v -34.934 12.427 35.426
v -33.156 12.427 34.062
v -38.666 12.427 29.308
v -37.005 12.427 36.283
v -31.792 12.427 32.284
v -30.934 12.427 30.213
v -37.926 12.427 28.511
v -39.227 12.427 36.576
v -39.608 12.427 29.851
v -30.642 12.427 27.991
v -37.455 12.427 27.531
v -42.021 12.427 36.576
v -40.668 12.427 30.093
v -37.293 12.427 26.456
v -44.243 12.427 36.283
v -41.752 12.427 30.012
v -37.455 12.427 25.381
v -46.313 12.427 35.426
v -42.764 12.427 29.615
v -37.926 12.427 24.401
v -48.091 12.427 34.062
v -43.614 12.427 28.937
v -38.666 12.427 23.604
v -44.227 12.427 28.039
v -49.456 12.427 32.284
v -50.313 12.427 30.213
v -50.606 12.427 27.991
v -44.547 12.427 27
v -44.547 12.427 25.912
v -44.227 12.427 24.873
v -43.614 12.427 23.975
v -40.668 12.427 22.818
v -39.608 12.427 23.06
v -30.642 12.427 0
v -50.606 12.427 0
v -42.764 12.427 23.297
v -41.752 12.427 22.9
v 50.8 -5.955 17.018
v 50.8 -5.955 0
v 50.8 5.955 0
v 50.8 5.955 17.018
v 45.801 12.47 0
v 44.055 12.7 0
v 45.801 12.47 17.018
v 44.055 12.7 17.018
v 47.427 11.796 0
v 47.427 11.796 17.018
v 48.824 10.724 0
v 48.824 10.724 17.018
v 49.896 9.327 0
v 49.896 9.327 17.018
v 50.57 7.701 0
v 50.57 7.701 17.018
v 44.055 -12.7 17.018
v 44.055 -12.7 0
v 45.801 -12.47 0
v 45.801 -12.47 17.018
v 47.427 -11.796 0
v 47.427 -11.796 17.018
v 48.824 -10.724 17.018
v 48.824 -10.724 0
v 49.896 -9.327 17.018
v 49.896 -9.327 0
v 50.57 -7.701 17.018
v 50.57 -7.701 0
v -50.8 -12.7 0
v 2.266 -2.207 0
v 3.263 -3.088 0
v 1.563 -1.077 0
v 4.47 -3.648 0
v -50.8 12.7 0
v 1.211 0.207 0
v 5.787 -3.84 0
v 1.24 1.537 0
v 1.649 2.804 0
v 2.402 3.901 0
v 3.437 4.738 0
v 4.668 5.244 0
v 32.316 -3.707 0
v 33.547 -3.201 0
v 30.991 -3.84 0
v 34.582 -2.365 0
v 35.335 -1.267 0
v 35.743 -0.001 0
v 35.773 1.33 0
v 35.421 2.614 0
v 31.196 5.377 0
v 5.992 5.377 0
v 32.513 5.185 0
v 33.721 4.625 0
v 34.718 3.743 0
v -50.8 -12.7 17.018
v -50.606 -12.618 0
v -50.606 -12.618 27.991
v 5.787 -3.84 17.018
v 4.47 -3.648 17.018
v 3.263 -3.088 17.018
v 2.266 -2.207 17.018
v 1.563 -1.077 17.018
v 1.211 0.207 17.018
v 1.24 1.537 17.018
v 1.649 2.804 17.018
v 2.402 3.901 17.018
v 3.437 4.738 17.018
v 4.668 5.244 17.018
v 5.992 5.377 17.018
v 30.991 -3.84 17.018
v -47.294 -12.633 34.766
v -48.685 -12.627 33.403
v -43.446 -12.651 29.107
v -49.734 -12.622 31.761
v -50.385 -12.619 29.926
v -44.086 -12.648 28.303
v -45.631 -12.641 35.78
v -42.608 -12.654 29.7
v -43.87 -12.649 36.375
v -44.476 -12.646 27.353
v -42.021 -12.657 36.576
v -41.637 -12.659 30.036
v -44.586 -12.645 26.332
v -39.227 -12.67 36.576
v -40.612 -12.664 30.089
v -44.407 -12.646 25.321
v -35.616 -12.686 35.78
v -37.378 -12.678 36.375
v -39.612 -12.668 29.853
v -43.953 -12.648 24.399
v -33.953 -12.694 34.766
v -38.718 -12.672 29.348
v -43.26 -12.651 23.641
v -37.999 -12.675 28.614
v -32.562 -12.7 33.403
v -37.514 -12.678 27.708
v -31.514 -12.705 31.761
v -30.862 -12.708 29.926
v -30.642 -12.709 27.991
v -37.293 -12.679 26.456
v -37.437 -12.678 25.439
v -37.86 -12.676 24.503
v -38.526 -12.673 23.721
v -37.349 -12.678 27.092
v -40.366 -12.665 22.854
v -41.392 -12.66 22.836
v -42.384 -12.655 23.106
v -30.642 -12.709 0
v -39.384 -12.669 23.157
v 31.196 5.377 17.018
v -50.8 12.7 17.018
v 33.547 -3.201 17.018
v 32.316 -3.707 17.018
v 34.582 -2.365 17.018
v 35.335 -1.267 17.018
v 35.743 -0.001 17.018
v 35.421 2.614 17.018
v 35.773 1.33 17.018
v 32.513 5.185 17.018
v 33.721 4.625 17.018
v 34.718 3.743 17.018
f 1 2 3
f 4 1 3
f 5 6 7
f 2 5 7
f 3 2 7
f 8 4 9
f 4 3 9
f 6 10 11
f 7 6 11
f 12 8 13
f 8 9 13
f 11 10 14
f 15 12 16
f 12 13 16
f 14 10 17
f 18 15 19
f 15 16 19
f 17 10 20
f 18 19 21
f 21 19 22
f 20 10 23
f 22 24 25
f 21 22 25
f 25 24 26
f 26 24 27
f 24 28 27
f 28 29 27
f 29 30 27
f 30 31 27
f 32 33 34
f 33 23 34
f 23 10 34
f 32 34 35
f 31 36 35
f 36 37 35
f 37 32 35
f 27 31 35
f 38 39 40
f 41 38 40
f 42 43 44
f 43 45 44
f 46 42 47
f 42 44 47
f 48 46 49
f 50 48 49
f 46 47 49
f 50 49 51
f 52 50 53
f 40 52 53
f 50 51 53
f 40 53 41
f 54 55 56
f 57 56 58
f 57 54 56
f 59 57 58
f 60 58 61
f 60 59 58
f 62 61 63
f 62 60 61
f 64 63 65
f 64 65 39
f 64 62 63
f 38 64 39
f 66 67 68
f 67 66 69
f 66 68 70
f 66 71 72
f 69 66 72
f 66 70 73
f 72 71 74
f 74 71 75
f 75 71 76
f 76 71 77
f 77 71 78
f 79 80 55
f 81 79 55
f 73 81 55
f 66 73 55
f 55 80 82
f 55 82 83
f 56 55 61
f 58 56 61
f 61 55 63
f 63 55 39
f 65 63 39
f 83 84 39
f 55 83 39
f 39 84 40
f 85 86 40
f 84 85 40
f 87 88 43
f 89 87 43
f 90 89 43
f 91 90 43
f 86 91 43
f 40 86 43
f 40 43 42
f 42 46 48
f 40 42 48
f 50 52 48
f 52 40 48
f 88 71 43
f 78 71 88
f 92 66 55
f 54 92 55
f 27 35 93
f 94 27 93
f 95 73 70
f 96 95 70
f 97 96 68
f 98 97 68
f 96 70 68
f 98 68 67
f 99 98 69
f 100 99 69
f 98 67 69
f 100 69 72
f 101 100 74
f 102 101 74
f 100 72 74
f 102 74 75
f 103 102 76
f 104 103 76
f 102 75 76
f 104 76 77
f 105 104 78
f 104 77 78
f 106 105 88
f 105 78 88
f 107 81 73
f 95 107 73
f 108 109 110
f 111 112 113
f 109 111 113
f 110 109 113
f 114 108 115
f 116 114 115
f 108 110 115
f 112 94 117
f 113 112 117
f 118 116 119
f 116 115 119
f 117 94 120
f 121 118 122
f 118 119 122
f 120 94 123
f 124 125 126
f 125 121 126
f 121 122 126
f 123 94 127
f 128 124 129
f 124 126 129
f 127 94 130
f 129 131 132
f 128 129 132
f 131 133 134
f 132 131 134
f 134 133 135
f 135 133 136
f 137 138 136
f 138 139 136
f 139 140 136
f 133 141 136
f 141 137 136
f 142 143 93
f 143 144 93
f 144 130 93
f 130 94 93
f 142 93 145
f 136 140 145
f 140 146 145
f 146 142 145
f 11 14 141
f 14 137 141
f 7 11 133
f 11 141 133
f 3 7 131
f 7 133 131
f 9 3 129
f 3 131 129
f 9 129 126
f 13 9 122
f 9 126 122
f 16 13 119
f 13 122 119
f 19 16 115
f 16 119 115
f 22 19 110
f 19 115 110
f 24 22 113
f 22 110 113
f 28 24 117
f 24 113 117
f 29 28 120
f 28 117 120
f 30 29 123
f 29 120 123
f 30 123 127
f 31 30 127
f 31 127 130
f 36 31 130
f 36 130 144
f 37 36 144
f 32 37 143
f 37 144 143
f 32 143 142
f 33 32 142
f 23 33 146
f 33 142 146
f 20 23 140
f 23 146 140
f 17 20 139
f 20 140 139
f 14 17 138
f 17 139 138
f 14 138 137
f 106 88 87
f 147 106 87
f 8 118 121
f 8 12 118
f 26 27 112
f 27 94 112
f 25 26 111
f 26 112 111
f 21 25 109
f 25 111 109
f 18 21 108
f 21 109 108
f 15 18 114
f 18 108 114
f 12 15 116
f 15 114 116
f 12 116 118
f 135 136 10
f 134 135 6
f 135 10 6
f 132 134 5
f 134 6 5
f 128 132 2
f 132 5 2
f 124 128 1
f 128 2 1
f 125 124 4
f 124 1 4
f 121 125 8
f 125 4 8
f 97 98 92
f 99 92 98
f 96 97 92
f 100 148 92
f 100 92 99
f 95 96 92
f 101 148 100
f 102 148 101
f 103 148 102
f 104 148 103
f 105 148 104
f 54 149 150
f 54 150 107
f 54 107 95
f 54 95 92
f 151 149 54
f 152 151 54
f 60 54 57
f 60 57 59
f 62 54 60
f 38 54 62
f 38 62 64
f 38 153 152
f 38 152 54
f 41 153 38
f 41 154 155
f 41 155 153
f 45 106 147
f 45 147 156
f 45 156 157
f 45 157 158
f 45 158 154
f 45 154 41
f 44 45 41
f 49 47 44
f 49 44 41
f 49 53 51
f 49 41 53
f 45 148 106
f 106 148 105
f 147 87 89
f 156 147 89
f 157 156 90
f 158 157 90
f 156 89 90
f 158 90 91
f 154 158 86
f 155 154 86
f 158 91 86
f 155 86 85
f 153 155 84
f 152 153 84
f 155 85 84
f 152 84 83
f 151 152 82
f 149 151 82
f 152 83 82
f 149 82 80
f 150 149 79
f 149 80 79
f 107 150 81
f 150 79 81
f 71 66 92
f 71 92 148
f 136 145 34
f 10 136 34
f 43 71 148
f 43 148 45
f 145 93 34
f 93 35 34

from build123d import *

# Parameters (mm, degrees)
F0_W     = 101.6
F0_H     = 25.4
F1_DEPTH = 17.018
F2_R     = 6.745313
F4_DEPTH = 36.576
F5_R     = 8.584943
F6_R     = 3.647702
F7_DEPTH = 35.7124


with BuildPart() as f1:
    # F0 (on Top) → F1 (new body)
    with BuildSketch(Plane.XY):
        Rectangle(F0_W, F0_H)
        with BuildLine():
            Line((5.992301, 5.37728), (31.1963, 5.37728))
            ThreePointArc((31.1963, 5.37728), (35.806323, 0.663675), (30.991462, -3.84049))
            Line((30.991462, -3.84049), (5.787463, -3.84049))
            ThreePointArc((5.787463, -3.84049), (1.17744, 0.873115), (5.992301, 5.37728))
        make_face(mode=Mode.SUBTRACT)
    extrude(amount=F1_DEPTH)

    # F2
    f2_edges = [f1.edges().sort_by_distance(p)[0] for p in [
        (50.8, -12.7, 8.509),
        (50.8, 12.7, 8.509),
    ]]
    fillet(f2_edges, radius=F2_R)


with BuildPart() as f4:
    # F3 (on Top) → F4 (new body)
    with BuildSketch(Plane.XY):
        Polygon((-50.605889, -12.61778), (-30.641558, -12.709112), (-30.641558, 12.426906), (-50.605889, 12.426906), align=None)
    extrude(amount=F4_DEPTH)

    # F5
    f5_edges = [f4.edges().sort_by_distance(p)[0] for p in [
        (-30.641558, -0.141103, 36.576),
        (-50.605889, -0.095437, 36.576),
    ]]
    fillet(f5_edges, radius=F5_R)

    # F6 (on Front) → F7 (cut, symmetric)
    with BuildSketch(Plane.XZ):
        with Locations((-40.940359, 26.455853)):
            Circle(F6_R)
    extrude(amount=F7_DEPTH, both=True, mode=Mode.SUBTRACT)


solid = Compound([f1.part, f4.part])
